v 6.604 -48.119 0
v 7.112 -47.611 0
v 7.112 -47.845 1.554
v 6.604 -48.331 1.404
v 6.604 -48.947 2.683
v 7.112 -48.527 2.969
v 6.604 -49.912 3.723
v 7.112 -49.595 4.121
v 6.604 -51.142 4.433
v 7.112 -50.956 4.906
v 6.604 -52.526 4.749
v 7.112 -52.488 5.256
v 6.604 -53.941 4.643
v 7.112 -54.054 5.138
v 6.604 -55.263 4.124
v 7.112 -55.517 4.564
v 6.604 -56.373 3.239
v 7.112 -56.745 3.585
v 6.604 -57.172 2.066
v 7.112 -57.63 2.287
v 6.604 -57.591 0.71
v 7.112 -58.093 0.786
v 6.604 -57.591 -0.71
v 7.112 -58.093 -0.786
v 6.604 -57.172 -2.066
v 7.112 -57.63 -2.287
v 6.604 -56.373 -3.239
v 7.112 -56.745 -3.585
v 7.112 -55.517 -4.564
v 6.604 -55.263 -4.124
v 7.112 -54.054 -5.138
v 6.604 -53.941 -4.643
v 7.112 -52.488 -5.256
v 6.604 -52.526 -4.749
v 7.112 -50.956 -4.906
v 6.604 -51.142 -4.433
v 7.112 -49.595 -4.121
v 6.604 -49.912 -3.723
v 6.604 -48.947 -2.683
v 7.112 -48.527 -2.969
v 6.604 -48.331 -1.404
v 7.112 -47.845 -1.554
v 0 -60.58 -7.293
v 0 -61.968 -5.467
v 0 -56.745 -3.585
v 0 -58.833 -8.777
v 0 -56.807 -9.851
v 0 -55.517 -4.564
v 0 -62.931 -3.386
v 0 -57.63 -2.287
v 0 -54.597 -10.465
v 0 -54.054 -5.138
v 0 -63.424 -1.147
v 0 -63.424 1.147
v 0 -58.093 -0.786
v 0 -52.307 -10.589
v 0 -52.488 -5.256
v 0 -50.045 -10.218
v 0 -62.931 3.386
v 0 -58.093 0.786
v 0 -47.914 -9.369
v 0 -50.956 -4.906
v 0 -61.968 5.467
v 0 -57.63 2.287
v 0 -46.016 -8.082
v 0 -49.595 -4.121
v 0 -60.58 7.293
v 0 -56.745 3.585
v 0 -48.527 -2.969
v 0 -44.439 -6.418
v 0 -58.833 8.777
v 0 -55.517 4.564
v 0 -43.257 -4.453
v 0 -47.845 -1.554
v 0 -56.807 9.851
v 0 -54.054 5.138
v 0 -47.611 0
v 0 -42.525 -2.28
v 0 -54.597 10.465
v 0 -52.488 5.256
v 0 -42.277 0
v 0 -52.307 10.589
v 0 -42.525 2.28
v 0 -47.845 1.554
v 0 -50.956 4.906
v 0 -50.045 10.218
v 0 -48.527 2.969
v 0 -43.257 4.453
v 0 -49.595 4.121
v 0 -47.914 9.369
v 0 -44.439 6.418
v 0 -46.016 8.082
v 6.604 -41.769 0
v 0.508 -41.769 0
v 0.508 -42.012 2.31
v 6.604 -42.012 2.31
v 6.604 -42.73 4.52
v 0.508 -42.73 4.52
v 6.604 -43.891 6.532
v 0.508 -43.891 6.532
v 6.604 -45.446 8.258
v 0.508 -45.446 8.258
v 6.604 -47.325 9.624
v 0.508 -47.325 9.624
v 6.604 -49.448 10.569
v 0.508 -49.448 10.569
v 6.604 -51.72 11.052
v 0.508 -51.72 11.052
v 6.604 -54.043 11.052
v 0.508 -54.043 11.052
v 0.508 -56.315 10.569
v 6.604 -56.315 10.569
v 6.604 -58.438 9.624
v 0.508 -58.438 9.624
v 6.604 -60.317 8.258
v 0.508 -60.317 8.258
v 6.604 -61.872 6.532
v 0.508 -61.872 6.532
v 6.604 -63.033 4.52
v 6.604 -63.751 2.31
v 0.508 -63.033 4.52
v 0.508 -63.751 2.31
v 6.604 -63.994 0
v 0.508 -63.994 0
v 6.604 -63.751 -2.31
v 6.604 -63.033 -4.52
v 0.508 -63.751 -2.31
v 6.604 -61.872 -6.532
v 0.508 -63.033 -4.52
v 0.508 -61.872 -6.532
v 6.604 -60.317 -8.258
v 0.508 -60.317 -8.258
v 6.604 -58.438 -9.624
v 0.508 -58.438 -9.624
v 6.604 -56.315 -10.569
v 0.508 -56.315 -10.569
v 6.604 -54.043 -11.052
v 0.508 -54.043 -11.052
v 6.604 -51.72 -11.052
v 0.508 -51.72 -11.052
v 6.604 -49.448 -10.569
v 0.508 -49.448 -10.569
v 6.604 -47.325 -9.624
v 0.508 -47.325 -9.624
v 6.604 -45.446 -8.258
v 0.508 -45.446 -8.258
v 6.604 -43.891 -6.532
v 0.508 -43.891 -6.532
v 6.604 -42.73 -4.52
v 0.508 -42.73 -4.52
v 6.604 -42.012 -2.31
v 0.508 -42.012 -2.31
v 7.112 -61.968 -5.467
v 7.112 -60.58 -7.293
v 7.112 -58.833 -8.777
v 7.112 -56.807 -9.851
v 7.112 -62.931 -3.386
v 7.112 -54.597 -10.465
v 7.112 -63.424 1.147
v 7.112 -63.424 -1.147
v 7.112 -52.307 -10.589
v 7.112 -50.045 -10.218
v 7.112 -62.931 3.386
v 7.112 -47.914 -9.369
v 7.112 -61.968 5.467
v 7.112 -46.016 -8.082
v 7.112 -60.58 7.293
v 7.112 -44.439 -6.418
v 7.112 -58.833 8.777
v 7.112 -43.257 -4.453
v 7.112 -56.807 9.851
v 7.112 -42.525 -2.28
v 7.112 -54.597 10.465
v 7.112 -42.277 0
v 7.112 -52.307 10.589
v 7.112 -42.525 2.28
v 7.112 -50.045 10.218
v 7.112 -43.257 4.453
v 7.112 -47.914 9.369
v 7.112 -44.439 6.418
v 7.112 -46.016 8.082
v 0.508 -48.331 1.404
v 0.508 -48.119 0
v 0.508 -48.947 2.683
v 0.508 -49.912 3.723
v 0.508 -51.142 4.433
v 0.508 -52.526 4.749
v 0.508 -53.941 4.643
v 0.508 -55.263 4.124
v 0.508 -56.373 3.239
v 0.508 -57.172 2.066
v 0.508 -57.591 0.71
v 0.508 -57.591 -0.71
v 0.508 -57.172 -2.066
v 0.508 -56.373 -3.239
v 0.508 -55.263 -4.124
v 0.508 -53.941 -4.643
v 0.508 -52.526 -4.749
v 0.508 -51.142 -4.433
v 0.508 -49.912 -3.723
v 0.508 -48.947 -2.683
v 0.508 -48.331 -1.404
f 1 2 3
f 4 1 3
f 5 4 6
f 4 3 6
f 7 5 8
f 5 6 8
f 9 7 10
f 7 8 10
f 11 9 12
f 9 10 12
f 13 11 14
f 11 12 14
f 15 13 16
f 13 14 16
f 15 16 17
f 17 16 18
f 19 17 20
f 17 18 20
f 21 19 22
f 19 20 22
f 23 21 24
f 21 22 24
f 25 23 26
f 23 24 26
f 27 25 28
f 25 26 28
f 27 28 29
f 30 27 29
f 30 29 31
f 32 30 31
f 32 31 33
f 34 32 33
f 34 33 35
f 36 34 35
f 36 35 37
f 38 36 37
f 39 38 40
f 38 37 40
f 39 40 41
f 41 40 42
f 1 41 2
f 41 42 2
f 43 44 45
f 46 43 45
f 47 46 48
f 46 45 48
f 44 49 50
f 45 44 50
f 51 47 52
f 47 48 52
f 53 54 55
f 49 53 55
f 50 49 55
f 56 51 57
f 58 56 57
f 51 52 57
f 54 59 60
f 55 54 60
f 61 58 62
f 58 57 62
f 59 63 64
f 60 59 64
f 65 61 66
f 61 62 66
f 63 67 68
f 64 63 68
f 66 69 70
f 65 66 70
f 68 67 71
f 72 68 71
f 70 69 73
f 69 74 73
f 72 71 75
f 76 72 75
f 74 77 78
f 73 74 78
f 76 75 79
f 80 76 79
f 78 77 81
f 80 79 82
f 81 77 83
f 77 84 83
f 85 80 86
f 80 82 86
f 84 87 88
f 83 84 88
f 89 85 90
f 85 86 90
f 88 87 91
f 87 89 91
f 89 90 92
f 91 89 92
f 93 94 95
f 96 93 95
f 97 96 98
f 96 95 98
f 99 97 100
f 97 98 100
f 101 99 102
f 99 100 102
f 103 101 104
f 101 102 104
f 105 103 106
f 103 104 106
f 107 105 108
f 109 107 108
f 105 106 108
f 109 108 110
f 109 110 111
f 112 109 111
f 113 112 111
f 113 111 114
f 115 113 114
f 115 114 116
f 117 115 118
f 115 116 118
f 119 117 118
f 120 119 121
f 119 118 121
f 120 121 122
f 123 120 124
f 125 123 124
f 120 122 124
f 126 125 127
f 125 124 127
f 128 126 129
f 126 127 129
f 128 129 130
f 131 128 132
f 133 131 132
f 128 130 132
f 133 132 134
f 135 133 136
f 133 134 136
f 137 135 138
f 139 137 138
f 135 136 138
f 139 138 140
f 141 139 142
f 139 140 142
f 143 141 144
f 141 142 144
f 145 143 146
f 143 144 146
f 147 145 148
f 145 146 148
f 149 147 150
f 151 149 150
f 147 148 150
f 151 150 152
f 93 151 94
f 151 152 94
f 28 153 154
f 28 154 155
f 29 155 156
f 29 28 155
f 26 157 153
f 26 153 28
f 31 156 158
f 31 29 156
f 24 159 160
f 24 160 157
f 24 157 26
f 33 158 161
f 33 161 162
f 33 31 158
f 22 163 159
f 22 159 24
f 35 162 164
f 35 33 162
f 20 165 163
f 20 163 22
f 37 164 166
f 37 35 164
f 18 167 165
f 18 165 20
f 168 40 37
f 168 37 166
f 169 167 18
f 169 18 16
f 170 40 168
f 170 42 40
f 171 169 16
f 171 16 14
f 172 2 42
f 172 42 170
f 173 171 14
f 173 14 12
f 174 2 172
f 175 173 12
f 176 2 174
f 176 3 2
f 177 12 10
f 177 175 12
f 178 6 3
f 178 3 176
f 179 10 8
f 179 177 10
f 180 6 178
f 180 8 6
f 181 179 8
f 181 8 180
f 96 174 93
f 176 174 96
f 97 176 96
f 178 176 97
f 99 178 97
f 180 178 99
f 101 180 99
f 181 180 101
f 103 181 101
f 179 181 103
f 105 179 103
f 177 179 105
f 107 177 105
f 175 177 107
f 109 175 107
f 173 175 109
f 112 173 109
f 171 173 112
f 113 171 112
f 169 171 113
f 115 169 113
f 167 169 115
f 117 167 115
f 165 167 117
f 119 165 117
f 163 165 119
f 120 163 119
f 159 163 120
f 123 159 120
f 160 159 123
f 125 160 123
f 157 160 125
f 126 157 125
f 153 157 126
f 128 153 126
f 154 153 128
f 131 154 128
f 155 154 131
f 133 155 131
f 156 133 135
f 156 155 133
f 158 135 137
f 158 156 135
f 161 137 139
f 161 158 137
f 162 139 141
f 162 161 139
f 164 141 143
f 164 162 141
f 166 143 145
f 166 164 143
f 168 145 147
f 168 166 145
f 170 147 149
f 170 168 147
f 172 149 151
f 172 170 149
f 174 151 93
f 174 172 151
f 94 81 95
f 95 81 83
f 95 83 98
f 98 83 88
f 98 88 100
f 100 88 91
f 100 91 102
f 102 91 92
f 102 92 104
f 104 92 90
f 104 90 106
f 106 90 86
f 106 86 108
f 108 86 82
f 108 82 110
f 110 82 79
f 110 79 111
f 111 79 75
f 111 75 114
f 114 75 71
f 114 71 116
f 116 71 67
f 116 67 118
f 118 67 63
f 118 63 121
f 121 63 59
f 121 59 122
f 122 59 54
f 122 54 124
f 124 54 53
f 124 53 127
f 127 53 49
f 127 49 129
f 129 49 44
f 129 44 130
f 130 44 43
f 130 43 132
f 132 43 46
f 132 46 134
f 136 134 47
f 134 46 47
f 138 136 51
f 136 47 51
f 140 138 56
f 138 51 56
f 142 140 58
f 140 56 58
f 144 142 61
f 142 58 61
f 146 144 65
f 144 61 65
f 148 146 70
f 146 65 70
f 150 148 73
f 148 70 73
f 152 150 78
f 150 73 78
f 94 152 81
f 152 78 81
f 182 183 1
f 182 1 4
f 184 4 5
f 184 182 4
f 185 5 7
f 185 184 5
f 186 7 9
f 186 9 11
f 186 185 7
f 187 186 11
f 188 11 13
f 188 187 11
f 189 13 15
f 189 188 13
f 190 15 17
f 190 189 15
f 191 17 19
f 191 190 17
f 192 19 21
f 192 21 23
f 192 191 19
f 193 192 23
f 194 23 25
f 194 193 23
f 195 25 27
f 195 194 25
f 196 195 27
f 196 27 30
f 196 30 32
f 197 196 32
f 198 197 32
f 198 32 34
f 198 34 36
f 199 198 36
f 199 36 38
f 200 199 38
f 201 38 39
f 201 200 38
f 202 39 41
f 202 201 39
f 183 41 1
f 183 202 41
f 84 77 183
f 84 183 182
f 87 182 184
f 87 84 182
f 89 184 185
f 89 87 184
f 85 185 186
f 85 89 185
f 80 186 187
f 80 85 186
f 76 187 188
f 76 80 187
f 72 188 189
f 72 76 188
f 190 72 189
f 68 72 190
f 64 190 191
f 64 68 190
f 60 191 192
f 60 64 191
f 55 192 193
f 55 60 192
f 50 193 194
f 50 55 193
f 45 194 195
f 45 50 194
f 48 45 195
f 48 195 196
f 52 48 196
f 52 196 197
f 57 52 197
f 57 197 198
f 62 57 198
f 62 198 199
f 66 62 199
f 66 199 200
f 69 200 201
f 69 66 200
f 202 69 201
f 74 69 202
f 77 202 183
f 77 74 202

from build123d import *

# Parameters (mm, degrees)
F0_R     = 11.1125
F0_R_2   = 4.7625
F1_DEPTH = 7.112
F2_SIZE  = 0.508


with BuildPart() as f1:
    # F0 (on Right) → F1 (new body)
    with BuildSketch(Plane.YZ):
        with Locations((-52.88154, 0)):
            Circle(F0_R)
        with Locations((-52.88154, 0)):
            Circle(F0_R_2, mode=Mode.SUBTRACT)
    extrude(amount=F1_DEPTH)

    # F2
    f2_edges = [f1.edges().sort_by_distance(p)[0] for p in [
        (7.112, -63.99404, 0),
        (7.112, -57.64404, 0),
        (0, -63.99404, 0),
        (0, -57.64404, 0),
    ]]
    chamfer(f2_edges, length=F2_SIZE)


solid = f1.part
